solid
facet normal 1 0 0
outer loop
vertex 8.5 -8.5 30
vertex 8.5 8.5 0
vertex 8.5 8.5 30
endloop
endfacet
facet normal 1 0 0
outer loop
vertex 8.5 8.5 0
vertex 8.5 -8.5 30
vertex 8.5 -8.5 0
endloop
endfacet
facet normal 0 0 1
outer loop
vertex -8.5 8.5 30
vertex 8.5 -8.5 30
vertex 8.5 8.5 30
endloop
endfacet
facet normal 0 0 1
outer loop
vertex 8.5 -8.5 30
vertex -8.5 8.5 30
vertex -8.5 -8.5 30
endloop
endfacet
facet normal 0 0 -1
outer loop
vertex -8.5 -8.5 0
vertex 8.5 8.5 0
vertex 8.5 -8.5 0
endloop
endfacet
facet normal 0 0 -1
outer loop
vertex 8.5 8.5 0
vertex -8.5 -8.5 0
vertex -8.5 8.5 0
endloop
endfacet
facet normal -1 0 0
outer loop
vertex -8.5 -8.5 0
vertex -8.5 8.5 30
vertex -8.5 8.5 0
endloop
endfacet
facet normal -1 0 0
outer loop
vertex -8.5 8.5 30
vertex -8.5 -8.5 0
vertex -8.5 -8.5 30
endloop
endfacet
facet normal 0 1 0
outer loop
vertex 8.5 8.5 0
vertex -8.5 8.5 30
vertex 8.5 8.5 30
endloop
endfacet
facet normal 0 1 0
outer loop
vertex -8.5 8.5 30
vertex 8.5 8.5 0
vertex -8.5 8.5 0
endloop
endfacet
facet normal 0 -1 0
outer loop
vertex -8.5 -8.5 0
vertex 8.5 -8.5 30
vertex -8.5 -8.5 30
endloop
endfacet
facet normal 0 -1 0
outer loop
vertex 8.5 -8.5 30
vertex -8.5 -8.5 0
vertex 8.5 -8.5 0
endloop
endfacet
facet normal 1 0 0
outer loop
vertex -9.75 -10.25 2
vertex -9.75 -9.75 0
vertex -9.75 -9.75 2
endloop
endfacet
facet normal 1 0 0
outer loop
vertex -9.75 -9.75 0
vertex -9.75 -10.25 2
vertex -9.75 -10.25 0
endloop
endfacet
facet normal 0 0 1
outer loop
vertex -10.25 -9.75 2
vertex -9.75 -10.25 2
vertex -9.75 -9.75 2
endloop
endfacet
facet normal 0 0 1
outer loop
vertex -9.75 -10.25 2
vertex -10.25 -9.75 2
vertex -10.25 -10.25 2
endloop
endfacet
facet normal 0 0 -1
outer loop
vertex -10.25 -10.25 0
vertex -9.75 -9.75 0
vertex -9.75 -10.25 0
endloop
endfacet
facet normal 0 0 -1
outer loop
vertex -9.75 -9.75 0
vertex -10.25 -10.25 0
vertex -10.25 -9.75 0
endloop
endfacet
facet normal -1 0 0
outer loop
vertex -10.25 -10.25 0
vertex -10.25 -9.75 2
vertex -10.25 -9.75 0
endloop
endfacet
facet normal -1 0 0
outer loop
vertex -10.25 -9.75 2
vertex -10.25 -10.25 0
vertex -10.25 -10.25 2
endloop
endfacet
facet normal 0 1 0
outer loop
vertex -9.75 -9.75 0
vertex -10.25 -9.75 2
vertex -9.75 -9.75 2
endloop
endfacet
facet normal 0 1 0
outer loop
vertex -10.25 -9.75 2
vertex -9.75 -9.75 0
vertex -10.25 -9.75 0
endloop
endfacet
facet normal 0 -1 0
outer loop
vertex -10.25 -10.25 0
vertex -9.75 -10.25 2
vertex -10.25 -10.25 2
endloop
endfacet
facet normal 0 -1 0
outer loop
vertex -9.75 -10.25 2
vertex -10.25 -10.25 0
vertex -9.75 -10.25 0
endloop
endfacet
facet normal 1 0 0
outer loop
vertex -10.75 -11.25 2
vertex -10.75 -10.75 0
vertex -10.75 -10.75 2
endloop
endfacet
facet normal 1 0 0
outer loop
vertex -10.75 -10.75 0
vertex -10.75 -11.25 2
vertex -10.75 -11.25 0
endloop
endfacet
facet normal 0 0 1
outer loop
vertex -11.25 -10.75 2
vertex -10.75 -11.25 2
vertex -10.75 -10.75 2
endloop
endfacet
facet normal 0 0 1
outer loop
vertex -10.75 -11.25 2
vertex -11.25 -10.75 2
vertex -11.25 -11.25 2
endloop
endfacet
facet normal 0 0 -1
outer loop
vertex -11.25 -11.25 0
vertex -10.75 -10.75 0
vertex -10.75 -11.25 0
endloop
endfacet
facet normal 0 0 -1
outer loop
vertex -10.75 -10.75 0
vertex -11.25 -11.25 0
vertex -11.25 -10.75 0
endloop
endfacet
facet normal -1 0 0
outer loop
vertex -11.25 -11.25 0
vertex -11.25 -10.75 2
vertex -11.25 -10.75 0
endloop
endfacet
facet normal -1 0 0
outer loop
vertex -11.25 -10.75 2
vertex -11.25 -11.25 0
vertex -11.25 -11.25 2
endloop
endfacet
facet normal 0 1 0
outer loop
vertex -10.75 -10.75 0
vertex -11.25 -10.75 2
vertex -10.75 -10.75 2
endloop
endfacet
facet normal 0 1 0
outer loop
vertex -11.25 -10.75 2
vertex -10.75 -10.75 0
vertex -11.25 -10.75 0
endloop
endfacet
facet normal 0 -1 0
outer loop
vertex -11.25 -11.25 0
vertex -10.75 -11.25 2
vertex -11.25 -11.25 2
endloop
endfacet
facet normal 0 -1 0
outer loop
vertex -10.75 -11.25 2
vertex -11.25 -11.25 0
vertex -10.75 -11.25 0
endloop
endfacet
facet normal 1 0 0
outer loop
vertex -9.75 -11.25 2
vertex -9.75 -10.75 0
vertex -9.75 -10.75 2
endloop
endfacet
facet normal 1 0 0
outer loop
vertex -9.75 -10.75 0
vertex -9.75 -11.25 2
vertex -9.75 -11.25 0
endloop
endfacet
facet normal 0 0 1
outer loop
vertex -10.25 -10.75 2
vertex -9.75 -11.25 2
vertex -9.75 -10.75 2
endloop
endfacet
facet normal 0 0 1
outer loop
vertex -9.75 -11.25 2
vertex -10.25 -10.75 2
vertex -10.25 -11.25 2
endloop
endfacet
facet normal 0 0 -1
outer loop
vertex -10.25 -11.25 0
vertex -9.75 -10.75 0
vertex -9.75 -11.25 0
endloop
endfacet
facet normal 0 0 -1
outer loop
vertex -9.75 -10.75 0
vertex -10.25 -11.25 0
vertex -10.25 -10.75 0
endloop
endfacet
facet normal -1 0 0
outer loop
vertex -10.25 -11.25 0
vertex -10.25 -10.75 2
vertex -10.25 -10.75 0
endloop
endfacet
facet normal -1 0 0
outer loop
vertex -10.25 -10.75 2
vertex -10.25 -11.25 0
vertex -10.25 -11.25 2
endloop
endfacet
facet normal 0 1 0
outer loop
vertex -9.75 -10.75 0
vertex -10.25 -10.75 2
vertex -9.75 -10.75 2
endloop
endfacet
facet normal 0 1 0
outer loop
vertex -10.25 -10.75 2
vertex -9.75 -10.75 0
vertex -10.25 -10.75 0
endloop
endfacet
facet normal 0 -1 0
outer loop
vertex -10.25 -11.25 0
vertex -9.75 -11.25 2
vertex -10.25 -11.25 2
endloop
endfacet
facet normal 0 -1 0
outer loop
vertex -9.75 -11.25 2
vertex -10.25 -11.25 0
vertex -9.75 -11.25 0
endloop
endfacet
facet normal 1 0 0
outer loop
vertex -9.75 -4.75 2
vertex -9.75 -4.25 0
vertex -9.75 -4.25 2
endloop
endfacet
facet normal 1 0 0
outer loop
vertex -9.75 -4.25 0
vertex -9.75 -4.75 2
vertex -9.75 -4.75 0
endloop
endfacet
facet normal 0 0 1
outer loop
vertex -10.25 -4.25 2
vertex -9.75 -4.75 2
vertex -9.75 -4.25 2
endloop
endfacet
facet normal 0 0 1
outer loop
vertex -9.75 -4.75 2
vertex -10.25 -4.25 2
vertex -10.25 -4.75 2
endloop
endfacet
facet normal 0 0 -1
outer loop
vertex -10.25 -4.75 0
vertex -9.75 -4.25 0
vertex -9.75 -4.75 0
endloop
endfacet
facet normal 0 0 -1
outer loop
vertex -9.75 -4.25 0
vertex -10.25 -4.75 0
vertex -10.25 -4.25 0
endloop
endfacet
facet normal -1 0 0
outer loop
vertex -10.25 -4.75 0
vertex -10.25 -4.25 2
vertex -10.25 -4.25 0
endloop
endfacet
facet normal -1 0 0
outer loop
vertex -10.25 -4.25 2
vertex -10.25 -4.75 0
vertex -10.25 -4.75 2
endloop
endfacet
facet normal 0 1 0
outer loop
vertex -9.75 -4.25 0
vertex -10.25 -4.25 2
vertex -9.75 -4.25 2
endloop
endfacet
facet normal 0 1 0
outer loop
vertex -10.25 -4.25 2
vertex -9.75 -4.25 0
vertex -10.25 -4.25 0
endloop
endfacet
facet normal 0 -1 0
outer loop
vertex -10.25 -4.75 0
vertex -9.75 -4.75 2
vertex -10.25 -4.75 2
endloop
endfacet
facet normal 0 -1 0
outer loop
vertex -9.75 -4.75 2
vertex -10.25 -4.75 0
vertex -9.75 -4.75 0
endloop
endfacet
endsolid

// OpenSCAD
translate([0, 0, 15]) color([0,1,0]) cube([17, 17, 30], center=true);
translate([-10, -10, 1]) color([1,0,0]) cube([0.5, 0.5, 2], center=true);
translate([-11, -11, 1]) color([1,0,0]) cube([0.5, 0.5, 2], center=true);
translate([-10, -11, 1]) color([1,0,0]) cube([0.5, 0.5, 2], center=true);
translate([-10, -4.5, 1]) color([1,0,0]) cube([0.5, 0.5, 2], center=true);
